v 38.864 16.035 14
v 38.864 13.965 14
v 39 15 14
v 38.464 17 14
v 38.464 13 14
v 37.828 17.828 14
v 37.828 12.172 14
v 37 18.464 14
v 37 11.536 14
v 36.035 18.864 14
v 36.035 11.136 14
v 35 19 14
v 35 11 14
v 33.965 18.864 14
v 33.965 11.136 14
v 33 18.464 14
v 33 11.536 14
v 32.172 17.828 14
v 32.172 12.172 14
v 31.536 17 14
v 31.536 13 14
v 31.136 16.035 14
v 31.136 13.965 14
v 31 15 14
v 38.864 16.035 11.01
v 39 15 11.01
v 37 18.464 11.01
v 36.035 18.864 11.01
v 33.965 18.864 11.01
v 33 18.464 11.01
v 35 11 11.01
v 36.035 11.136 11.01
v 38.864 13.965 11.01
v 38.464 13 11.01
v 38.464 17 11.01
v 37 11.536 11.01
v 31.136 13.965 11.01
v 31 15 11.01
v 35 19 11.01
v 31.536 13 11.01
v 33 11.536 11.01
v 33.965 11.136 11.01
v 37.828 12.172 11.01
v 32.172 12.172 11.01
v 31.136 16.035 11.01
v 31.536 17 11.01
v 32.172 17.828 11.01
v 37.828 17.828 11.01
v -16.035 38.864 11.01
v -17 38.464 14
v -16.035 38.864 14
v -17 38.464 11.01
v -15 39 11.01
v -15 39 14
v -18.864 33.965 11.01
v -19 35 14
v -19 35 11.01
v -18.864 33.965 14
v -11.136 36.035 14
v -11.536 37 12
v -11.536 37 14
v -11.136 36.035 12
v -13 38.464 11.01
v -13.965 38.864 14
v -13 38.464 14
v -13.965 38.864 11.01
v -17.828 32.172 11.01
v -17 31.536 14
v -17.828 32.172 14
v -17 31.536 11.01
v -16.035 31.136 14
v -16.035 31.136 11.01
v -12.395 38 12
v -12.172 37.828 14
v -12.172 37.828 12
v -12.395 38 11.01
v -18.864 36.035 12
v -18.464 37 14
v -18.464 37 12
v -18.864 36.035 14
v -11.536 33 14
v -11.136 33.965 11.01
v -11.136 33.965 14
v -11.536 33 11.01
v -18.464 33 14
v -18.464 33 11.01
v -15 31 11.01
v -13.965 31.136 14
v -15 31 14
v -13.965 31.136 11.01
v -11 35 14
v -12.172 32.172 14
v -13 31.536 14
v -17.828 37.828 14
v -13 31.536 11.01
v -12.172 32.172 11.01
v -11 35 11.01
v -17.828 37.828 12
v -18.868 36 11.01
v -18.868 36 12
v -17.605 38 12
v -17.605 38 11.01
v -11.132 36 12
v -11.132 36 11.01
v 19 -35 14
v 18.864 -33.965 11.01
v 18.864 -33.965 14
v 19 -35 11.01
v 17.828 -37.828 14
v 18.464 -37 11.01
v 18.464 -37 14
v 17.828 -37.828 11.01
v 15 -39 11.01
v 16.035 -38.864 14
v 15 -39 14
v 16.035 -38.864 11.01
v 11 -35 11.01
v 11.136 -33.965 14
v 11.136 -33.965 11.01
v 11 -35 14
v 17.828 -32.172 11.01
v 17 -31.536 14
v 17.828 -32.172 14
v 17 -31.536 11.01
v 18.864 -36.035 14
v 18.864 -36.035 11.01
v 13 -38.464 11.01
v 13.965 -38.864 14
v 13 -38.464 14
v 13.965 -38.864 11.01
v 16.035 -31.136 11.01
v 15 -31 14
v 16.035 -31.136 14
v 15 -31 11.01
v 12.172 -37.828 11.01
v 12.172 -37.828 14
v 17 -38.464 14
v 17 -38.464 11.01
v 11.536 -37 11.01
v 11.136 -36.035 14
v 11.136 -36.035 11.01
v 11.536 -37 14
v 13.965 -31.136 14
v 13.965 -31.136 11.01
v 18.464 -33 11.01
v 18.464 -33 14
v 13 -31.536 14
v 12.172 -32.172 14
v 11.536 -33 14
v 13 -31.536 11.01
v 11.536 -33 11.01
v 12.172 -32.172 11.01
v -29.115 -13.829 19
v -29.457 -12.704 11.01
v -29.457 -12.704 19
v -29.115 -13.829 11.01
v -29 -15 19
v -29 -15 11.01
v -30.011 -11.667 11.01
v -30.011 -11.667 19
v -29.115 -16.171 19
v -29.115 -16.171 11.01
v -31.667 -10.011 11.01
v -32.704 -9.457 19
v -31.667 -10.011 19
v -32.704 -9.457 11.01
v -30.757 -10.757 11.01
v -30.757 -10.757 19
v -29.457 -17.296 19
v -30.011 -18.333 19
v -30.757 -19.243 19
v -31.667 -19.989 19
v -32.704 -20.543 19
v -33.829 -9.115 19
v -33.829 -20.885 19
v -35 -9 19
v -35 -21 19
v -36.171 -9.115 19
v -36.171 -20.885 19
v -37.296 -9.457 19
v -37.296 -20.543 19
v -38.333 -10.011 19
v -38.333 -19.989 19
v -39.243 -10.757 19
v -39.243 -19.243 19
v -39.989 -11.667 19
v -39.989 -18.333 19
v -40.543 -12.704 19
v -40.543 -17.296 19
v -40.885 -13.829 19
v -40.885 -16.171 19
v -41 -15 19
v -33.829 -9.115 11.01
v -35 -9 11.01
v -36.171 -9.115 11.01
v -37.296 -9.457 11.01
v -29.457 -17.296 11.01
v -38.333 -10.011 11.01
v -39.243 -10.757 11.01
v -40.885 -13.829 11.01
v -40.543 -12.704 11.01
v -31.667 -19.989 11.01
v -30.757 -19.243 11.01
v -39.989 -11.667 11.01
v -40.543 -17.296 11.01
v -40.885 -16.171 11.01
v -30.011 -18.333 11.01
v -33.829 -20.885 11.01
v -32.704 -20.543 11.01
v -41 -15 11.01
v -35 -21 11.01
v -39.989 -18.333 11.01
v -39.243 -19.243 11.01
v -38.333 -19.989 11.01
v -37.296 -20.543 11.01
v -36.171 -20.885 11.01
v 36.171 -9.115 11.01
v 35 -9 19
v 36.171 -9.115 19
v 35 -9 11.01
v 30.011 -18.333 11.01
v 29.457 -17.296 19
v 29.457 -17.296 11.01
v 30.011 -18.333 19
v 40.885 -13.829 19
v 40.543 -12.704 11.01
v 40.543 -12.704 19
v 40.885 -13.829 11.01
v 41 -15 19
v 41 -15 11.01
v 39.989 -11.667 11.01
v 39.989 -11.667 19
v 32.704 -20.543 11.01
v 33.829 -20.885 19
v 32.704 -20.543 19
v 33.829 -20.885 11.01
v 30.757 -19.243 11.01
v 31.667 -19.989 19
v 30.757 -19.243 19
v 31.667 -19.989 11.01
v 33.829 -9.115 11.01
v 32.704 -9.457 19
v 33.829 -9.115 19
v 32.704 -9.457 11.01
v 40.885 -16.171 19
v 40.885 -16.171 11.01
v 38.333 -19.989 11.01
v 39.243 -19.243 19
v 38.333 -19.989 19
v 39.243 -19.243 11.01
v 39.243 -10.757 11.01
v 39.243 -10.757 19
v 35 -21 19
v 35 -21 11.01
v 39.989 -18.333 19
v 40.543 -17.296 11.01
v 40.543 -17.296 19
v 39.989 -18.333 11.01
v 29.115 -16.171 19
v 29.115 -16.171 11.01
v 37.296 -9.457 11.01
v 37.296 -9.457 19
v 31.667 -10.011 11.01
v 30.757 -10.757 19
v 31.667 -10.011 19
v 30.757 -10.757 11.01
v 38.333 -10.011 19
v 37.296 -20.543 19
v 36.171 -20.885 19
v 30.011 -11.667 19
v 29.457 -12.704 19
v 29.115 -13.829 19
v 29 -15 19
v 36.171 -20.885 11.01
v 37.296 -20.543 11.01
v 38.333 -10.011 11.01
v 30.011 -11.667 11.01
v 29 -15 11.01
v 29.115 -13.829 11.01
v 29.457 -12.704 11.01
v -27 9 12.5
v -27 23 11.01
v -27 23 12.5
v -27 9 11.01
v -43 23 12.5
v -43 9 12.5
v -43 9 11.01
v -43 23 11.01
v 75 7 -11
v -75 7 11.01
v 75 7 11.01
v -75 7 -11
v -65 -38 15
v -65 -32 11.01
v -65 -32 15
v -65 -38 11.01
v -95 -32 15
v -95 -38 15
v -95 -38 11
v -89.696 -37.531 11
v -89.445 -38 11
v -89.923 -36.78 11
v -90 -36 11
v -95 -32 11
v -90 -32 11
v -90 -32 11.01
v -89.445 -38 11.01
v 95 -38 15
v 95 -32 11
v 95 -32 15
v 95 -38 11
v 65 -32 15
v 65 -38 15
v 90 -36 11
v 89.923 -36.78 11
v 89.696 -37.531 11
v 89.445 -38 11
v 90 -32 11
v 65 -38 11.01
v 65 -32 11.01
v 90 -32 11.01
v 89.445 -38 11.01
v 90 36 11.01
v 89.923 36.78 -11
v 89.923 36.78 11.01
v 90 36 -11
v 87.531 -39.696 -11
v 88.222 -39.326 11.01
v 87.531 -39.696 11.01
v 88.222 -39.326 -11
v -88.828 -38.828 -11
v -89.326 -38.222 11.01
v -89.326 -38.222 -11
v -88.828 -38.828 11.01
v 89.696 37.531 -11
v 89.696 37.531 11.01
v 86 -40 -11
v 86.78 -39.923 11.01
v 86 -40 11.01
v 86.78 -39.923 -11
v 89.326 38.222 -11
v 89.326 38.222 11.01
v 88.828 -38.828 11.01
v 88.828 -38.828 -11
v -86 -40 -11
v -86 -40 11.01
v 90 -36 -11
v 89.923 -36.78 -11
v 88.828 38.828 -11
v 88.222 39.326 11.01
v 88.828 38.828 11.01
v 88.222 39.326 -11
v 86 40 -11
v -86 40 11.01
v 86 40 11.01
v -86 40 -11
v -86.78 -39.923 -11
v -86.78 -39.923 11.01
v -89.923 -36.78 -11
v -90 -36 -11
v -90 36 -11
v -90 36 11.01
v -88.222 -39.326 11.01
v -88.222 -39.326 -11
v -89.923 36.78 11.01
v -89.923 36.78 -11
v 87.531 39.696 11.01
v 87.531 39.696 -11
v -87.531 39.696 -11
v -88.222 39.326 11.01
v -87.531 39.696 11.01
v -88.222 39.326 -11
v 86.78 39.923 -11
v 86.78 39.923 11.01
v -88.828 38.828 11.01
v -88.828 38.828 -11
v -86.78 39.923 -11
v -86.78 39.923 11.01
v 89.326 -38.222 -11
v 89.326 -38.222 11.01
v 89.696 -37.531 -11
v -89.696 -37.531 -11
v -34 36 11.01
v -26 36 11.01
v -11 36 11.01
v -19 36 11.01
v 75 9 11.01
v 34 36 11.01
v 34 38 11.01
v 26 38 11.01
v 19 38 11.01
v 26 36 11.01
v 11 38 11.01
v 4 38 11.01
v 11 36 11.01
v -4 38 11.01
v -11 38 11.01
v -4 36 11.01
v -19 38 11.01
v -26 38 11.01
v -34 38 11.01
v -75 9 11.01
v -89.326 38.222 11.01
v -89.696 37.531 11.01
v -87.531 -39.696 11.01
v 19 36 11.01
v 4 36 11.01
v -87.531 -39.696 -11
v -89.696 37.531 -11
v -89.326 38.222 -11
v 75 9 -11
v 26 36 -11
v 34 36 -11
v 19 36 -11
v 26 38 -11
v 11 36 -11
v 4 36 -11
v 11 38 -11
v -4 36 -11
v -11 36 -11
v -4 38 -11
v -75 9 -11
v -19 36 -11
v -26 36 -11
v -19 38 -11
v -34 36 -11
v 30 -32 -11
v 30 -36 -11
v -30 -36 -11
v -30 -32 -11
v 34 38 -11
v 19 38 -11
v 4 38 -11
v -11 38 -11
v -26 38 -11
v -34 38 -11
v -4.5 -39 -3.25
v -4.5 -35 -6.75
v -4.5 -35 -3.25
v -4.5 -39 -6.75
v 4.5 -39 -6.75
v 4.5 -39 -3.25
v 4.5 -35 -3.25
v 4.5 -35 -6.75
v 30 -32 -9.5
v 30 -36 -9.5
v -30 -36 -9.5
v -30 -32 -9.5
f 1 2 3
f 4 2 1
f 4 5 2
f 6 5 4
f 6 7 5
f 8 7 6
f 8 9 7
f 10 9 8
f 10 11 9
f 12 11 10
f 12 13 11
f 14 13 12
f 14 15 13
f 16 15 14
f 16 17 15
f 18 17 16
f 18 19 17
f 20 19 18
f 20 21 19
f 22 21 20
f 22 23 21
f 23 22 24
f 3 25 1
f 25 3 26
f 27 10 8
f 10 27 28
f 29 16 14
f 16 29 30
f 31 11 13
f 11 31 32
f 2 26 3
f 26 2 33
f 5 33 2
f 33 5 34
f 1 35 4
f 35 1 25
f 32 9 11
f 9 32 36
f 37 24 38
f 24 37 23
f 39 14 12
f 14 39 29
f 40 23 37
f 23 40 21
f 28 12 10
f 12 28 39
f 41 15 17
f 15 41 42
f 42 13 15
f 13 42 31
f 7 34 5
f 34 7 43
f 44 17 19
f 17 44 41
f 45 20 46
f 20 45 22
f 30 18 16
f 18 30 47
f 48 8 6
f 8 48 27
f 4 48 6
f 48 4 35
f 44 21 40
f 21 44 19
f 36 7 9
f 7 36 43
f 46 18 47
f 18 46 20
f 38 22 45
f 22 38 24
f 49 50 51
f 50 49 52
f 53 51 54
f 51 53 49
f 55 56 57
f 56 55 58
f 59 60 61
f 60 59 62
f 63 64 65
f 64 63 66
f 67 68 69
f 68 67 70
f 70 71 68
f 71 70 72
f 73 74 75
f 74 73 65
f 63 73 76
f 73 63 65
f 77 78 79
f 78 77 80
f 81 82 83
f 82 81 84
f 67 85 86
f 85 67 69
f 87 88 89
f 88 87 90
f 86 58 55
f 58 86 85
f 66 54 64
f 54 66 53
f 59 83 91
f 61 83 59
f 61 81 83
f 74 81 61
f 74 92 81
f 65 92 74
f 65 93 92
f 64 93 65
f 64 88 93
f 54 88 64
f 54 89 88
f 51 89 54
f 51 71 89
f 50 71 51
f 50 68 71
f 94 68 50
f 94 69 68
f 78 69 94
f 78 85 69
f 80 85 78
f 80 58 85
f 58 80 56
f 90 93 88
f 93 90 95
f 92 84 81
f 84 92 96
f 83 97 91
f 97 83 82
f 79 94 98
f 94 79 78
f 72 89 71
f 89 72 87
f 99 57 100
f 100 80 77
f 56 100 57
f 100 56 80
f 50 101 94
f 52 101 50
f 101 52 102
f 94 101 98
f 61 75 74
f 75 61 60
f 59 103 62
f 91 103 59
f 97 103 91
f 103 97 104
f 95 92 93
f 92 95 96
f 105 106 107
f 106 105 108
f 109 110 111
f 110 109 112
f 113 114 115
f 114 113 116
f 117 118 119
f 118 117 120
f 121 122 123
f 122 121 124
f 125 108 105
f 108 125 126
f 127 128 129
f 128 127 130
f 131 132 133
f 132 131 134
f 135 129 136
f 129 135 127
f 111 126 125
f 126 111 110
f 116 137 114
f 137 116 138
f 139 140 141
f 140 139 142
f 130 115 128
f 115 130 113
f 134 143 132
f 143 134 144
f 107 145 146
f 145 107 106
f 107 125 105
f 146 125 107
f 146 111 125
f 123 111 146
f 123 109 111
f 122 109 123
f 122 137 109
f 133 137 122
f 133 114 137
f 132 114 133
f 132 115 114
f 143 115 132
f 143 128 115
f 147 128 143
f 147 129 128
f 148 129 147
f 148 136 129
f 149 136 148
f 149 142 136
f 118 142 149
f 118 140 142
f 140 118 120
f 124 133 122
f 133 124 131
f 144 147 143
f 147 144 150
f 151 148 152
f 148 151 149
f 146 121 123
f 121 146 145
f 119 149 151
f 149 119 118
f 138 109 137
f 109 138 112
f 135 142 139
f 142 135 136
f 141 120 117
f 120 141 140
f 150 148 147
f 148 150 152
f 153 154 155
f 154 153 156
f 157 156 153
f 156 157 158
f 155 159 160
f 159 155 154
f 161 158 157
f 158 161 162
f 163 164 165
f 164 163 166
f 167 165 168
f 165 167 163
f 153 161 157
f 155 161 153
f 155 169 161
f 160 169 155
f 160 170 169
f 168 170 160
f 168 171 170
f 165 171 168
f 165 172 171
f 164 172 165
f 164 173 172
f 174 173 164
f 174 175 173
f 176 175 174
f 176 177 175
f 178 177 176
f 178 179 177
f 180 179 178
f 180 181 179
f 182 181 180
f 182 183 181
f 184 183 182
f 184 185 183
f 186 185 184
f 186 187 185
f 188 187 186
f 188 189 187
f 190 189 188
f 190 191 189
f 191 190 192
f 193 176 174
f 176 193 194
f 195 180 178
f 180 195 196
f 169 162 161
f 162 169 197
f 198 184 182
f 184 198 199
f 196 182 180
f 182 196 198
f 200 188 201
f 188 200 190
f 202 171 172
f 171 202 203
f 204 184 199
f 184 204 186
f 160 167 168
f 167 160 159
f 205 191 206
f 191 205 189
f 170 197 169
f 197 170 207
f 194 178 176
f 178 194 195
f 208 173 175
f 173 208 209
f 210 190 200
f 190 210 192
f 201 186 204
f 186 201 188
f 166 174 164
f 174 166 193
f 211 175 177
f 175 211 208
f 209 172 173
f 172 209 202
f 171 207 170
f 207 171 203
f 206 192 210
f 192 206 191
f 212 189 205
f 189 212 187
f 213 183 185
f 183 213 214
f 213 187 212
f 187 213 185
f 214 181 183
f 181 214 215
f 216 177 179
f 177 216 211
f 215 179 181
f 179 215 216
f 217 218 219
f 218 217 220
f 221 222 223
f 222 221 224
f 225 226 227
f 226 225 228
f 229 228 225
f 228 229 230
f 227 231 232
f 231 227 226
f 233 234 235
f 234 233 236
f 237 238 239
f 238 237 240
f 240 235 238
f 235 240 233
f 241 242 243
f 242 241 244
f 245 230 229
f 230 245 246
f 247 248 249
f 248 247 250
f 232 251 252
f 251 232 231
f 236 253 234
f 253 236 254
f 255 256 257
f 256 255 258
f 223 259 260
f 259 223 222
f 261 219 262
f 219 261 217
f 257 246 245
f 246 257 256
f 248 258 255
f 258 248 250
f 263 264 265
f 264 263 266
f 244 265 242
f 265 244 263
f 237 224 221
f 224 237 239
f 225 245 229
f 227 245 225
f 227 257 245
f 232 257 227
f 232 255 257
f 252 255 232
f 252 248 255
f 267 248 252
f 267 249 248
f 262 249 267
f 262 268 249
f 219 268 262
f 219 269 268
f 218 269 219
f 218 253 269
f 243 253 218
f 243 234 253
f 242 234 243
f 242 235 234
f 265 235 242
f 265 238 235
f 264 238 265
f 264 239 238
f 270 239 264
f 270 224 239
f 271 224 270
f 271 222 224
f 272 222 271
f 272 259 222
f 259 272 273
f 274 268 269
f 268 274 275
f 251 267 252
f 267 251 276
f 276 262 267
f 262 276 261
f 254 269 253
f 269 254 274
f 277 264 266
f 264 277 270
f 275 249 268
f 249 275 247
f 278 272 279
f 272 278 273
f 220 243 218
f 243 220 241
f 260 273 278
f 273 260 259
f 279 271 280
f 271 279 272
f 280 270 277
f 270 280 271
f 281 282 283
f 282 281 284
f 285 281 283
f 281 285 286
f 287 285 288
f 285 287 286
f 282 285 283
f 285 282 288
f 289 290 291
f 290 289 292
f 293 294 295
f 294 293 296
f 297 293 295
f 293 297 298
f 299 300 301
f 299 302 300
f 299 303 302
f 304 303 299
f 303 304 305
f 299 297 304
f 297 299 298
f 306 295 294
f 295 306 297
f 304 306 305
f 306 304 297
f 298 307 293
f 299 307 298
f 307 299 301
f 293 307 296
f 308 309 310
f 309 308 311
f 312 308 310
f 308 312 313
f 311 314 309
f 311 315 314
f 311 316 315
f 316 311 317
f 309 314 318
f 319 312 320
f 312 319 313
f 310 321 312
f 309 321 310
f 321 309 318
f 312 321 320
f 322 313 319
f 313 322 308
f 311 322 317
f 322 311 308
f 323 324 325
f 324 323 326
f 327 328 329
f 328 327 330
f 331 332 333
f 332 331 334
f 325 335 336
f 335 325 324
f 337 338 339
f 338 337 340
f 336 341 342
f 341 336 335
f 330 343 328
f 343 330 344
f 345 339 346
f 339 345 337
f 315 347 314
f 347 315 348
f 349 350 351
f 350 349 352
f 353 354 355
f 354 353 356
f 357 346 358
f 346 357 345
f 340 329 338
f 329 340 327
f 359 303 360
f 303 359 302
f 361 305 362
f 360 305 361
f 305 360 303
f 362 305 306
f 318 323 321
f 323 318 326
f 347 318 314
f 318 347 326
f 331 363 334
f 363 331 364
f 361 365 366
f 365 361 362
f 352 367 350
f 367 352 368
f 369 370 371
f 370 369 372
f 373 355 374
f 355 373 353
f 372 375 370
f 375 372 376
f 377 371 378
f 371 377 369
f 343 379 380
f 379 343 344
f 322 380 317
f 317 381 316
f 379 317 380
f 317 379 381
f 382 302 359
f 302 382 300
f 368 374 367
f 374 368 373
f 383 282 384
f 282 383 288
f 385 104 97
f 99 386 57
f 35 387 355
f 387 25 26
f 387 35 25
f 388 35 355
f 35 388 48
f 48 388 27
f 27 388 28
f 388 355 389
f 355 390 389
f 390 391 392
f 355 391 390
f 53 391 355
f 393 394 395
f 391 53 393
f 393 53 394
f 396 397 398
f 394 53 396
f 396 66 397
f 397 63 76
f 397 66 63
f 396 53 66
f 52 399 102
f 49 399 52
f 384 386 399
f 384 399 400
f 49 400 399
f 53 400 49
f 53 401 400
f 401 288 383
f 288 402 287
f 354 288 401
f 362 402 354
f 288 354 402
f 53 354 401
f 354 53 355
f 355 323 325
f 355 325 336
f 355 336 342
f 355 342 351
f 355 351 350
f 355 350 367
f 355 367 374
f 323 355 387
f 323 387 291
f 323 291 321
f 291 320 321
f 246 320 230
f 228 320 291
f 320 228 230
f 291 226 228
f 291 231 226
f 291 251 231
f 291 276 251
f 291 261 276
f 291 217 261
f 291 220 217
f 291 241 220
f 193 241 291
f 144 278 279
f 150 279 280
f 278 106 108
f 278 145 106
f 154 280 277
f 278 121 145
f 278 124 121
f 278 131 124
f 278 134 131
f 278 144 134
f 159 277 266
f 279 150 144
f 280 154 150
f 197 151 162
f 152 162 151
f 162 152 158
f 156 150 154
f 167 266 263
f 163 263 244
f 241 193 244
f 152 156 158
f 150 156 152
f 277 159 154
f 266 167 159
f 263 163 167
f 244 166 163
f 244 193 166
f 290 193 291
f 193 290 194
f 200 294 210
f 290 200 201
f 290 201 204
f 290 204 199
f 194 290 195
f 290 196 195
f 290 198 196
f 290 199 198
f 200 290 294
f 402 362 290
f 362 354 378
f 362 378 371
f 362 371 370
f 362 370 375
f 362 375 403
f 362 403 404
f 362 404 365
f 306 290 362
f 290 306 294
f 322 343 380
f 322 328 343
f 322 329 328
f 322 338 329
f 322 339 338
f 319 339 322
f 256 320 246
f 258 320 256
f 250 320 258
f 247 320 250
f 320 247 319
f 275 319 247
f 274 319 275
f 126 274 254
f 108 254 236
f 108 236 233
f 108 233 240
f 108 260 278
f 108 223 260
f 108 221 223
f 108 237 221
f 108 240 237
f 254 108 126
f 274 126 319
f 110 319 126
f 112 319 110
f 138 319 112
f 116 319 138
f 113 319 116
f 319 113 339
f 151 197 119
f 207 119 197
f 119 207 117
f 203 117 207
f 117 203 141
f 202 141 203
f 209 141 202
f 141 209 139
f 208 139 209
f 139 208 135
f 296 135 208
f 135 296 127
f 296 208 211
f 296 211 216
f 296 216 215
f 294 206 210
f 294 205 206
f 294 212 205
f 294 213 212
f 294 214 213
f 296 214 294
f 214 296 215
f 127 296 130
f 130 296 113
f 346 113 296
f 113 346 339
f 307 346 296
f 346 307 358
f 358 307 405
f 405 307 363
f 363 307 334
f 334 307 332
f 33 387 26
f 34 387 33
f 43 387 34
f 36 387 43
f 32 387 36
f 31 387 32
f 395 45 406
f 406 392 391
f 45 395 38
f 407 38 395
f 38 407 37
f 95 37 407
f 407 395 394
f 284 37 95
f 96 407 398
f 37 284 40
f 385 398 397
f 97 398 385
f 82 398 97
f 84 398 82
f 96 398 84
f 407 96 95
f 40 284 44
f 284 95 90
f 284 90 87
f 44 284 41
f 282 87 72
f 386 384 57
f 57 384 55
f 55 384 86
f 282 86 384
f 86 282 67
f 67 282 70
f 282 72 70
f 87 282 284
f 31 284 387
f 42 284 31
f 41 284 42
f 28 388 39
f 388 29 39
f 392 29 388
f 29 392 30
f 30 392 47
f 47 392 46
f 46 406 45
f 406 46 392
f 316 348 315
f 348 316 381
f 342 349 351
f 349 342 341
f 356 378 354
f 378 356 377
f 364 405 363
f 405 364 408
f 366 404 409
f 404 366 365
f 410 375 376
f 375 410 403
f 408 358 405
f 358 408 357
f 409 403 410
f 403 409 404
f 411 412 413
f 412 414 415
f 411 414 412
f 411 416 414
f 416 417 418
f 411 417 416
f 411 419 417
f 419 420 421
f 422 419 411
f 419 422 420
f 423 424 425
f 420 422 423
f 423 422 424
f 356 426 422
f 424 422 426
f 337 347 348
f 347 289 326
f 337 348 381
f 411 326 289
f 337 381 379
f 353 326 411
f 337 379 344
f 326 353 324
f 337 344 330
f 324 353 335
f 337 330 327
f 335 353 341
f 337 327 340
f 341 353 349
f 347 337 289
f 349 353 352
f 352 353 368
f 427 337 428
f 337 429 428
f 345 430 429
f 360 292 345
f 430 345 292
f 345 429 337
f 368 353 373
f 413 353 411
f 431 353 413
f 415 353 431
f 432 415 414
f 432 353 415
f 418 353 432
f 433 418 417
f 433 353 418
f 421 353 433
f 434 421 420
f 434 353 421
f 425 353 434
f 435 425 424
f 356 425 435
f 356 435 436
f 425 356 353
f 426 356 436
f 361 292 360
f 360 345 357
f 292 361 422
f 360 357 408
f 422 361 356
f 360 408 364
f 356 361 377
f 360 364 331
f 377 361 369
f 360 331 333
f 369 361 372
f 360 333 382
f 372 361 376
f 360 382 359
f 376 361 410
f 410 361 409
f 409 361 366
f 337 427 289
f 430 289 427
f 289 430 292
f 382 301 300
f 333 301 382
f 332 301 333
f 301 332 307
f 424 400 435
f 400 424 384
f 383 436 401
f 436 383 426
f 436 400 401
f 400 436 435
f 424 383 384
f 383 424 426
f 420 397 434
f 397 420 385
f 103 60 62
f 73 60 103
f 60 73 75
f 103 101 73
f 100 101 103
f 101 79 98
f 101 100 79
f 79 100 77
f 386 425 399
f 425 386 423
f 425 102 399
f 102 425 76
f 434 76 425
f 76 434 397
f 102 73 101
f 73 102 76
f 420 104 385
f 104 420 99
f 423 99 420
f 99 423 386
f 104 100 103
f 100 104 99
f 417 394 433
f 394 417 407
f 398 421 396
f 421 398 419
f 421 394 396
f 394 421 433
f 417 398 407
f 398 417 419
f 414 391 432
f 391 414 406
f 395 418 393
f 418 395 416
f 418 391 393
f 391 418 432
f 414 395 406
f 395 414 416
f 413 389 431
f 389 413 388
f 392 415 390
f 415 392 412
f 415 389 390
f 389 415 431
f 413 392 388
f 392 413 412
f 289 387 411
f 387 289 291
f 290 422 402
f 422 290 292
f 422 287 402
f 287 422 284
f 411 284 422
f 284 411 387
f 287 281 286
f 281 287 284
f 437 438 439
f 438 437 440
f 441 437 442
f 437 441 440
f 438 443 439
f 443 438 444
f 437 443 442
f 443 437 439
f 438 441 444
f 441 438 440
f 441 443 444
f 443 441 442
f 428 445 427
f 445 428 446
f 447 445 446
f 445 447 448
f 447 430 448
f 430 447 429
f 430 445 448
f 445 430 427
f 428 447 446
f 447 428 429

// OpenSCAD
// file: ../common/ports.scad
module usb_c_cutout() {
  translate([0,0,-1]) cube([9, 3.5, wall+2], center=true);
}
module usb_a_cutout() {
  translate([0,0,-1]) cube([12, 5, wall+2], center=true);
}
module audio_3_5_cutout() {
  translate([0,0,-1]) cylinder(h=wall+2, d=6, $fn=32);
}
// file: ../common/dimensions.scad
// Shared dimensions — EVT-0 concept only
wall = 2;
corner_r = 4;
badge_w = 12;
badge_h = 3;
// main file
include <../common/dimensions.scad>
include <../common/ports.scad>

body_l=180; body_w=80; body_h=22;

module handheld_body() {
  difference() {
    minkowski() {
      cube([body_l-2*corner_r, body_w-2*corner_r, body_h], center=true);
      cylinder(r=corner_r, h=0.01, $fn=32);
    }
  }
}

module screen_cutout() {
  translate([0,8,body_h/2-1]) cube([body_l-30, 2, body_w-20], center=true);
}

module controls() {
  // sticks
  translate([-35,-15,body_h/2]) cylinder(h=8, d=12, $fn=32);
  translate([35,-15,body_h/2]) cylinder(h=8, d=12, $fn=32);
  // d-pad
  translate([-35,15,body_h/2]) cube([16,16,3], center=true);
  // ABXY
  for (a=[0:3]) rotate([0,0,a*90]) translate([35,15,body_h/2]) cylinder(h=3, d=8, $fn=24);
  // shoulders
  translate([-body_l/2+10, -body_w/2+5, body_h/2+2]) cube([30,6,4], center=true);
  translate([body_l/2-10, -body_w/2+5, body_h/2+2]) cube([30,6,4], center=true);
}

difference() {
  union() { handheld_body(); controls(); }
  screen_cutout();
  // USB-C bottom
  translate([0,-body_w/2+2, -5]) rotate([90,0,0]) usb_c_cutout();
  // speaker grills
  for (i=[-2:2]) translate([i*15, body_w/2-3, 0]) cube([8,2,body_h+2], center=true);
  // dock groove
  translate([0,-body_w/2+6, -body_h/2]) cube([60,4,3], center=true);
}
